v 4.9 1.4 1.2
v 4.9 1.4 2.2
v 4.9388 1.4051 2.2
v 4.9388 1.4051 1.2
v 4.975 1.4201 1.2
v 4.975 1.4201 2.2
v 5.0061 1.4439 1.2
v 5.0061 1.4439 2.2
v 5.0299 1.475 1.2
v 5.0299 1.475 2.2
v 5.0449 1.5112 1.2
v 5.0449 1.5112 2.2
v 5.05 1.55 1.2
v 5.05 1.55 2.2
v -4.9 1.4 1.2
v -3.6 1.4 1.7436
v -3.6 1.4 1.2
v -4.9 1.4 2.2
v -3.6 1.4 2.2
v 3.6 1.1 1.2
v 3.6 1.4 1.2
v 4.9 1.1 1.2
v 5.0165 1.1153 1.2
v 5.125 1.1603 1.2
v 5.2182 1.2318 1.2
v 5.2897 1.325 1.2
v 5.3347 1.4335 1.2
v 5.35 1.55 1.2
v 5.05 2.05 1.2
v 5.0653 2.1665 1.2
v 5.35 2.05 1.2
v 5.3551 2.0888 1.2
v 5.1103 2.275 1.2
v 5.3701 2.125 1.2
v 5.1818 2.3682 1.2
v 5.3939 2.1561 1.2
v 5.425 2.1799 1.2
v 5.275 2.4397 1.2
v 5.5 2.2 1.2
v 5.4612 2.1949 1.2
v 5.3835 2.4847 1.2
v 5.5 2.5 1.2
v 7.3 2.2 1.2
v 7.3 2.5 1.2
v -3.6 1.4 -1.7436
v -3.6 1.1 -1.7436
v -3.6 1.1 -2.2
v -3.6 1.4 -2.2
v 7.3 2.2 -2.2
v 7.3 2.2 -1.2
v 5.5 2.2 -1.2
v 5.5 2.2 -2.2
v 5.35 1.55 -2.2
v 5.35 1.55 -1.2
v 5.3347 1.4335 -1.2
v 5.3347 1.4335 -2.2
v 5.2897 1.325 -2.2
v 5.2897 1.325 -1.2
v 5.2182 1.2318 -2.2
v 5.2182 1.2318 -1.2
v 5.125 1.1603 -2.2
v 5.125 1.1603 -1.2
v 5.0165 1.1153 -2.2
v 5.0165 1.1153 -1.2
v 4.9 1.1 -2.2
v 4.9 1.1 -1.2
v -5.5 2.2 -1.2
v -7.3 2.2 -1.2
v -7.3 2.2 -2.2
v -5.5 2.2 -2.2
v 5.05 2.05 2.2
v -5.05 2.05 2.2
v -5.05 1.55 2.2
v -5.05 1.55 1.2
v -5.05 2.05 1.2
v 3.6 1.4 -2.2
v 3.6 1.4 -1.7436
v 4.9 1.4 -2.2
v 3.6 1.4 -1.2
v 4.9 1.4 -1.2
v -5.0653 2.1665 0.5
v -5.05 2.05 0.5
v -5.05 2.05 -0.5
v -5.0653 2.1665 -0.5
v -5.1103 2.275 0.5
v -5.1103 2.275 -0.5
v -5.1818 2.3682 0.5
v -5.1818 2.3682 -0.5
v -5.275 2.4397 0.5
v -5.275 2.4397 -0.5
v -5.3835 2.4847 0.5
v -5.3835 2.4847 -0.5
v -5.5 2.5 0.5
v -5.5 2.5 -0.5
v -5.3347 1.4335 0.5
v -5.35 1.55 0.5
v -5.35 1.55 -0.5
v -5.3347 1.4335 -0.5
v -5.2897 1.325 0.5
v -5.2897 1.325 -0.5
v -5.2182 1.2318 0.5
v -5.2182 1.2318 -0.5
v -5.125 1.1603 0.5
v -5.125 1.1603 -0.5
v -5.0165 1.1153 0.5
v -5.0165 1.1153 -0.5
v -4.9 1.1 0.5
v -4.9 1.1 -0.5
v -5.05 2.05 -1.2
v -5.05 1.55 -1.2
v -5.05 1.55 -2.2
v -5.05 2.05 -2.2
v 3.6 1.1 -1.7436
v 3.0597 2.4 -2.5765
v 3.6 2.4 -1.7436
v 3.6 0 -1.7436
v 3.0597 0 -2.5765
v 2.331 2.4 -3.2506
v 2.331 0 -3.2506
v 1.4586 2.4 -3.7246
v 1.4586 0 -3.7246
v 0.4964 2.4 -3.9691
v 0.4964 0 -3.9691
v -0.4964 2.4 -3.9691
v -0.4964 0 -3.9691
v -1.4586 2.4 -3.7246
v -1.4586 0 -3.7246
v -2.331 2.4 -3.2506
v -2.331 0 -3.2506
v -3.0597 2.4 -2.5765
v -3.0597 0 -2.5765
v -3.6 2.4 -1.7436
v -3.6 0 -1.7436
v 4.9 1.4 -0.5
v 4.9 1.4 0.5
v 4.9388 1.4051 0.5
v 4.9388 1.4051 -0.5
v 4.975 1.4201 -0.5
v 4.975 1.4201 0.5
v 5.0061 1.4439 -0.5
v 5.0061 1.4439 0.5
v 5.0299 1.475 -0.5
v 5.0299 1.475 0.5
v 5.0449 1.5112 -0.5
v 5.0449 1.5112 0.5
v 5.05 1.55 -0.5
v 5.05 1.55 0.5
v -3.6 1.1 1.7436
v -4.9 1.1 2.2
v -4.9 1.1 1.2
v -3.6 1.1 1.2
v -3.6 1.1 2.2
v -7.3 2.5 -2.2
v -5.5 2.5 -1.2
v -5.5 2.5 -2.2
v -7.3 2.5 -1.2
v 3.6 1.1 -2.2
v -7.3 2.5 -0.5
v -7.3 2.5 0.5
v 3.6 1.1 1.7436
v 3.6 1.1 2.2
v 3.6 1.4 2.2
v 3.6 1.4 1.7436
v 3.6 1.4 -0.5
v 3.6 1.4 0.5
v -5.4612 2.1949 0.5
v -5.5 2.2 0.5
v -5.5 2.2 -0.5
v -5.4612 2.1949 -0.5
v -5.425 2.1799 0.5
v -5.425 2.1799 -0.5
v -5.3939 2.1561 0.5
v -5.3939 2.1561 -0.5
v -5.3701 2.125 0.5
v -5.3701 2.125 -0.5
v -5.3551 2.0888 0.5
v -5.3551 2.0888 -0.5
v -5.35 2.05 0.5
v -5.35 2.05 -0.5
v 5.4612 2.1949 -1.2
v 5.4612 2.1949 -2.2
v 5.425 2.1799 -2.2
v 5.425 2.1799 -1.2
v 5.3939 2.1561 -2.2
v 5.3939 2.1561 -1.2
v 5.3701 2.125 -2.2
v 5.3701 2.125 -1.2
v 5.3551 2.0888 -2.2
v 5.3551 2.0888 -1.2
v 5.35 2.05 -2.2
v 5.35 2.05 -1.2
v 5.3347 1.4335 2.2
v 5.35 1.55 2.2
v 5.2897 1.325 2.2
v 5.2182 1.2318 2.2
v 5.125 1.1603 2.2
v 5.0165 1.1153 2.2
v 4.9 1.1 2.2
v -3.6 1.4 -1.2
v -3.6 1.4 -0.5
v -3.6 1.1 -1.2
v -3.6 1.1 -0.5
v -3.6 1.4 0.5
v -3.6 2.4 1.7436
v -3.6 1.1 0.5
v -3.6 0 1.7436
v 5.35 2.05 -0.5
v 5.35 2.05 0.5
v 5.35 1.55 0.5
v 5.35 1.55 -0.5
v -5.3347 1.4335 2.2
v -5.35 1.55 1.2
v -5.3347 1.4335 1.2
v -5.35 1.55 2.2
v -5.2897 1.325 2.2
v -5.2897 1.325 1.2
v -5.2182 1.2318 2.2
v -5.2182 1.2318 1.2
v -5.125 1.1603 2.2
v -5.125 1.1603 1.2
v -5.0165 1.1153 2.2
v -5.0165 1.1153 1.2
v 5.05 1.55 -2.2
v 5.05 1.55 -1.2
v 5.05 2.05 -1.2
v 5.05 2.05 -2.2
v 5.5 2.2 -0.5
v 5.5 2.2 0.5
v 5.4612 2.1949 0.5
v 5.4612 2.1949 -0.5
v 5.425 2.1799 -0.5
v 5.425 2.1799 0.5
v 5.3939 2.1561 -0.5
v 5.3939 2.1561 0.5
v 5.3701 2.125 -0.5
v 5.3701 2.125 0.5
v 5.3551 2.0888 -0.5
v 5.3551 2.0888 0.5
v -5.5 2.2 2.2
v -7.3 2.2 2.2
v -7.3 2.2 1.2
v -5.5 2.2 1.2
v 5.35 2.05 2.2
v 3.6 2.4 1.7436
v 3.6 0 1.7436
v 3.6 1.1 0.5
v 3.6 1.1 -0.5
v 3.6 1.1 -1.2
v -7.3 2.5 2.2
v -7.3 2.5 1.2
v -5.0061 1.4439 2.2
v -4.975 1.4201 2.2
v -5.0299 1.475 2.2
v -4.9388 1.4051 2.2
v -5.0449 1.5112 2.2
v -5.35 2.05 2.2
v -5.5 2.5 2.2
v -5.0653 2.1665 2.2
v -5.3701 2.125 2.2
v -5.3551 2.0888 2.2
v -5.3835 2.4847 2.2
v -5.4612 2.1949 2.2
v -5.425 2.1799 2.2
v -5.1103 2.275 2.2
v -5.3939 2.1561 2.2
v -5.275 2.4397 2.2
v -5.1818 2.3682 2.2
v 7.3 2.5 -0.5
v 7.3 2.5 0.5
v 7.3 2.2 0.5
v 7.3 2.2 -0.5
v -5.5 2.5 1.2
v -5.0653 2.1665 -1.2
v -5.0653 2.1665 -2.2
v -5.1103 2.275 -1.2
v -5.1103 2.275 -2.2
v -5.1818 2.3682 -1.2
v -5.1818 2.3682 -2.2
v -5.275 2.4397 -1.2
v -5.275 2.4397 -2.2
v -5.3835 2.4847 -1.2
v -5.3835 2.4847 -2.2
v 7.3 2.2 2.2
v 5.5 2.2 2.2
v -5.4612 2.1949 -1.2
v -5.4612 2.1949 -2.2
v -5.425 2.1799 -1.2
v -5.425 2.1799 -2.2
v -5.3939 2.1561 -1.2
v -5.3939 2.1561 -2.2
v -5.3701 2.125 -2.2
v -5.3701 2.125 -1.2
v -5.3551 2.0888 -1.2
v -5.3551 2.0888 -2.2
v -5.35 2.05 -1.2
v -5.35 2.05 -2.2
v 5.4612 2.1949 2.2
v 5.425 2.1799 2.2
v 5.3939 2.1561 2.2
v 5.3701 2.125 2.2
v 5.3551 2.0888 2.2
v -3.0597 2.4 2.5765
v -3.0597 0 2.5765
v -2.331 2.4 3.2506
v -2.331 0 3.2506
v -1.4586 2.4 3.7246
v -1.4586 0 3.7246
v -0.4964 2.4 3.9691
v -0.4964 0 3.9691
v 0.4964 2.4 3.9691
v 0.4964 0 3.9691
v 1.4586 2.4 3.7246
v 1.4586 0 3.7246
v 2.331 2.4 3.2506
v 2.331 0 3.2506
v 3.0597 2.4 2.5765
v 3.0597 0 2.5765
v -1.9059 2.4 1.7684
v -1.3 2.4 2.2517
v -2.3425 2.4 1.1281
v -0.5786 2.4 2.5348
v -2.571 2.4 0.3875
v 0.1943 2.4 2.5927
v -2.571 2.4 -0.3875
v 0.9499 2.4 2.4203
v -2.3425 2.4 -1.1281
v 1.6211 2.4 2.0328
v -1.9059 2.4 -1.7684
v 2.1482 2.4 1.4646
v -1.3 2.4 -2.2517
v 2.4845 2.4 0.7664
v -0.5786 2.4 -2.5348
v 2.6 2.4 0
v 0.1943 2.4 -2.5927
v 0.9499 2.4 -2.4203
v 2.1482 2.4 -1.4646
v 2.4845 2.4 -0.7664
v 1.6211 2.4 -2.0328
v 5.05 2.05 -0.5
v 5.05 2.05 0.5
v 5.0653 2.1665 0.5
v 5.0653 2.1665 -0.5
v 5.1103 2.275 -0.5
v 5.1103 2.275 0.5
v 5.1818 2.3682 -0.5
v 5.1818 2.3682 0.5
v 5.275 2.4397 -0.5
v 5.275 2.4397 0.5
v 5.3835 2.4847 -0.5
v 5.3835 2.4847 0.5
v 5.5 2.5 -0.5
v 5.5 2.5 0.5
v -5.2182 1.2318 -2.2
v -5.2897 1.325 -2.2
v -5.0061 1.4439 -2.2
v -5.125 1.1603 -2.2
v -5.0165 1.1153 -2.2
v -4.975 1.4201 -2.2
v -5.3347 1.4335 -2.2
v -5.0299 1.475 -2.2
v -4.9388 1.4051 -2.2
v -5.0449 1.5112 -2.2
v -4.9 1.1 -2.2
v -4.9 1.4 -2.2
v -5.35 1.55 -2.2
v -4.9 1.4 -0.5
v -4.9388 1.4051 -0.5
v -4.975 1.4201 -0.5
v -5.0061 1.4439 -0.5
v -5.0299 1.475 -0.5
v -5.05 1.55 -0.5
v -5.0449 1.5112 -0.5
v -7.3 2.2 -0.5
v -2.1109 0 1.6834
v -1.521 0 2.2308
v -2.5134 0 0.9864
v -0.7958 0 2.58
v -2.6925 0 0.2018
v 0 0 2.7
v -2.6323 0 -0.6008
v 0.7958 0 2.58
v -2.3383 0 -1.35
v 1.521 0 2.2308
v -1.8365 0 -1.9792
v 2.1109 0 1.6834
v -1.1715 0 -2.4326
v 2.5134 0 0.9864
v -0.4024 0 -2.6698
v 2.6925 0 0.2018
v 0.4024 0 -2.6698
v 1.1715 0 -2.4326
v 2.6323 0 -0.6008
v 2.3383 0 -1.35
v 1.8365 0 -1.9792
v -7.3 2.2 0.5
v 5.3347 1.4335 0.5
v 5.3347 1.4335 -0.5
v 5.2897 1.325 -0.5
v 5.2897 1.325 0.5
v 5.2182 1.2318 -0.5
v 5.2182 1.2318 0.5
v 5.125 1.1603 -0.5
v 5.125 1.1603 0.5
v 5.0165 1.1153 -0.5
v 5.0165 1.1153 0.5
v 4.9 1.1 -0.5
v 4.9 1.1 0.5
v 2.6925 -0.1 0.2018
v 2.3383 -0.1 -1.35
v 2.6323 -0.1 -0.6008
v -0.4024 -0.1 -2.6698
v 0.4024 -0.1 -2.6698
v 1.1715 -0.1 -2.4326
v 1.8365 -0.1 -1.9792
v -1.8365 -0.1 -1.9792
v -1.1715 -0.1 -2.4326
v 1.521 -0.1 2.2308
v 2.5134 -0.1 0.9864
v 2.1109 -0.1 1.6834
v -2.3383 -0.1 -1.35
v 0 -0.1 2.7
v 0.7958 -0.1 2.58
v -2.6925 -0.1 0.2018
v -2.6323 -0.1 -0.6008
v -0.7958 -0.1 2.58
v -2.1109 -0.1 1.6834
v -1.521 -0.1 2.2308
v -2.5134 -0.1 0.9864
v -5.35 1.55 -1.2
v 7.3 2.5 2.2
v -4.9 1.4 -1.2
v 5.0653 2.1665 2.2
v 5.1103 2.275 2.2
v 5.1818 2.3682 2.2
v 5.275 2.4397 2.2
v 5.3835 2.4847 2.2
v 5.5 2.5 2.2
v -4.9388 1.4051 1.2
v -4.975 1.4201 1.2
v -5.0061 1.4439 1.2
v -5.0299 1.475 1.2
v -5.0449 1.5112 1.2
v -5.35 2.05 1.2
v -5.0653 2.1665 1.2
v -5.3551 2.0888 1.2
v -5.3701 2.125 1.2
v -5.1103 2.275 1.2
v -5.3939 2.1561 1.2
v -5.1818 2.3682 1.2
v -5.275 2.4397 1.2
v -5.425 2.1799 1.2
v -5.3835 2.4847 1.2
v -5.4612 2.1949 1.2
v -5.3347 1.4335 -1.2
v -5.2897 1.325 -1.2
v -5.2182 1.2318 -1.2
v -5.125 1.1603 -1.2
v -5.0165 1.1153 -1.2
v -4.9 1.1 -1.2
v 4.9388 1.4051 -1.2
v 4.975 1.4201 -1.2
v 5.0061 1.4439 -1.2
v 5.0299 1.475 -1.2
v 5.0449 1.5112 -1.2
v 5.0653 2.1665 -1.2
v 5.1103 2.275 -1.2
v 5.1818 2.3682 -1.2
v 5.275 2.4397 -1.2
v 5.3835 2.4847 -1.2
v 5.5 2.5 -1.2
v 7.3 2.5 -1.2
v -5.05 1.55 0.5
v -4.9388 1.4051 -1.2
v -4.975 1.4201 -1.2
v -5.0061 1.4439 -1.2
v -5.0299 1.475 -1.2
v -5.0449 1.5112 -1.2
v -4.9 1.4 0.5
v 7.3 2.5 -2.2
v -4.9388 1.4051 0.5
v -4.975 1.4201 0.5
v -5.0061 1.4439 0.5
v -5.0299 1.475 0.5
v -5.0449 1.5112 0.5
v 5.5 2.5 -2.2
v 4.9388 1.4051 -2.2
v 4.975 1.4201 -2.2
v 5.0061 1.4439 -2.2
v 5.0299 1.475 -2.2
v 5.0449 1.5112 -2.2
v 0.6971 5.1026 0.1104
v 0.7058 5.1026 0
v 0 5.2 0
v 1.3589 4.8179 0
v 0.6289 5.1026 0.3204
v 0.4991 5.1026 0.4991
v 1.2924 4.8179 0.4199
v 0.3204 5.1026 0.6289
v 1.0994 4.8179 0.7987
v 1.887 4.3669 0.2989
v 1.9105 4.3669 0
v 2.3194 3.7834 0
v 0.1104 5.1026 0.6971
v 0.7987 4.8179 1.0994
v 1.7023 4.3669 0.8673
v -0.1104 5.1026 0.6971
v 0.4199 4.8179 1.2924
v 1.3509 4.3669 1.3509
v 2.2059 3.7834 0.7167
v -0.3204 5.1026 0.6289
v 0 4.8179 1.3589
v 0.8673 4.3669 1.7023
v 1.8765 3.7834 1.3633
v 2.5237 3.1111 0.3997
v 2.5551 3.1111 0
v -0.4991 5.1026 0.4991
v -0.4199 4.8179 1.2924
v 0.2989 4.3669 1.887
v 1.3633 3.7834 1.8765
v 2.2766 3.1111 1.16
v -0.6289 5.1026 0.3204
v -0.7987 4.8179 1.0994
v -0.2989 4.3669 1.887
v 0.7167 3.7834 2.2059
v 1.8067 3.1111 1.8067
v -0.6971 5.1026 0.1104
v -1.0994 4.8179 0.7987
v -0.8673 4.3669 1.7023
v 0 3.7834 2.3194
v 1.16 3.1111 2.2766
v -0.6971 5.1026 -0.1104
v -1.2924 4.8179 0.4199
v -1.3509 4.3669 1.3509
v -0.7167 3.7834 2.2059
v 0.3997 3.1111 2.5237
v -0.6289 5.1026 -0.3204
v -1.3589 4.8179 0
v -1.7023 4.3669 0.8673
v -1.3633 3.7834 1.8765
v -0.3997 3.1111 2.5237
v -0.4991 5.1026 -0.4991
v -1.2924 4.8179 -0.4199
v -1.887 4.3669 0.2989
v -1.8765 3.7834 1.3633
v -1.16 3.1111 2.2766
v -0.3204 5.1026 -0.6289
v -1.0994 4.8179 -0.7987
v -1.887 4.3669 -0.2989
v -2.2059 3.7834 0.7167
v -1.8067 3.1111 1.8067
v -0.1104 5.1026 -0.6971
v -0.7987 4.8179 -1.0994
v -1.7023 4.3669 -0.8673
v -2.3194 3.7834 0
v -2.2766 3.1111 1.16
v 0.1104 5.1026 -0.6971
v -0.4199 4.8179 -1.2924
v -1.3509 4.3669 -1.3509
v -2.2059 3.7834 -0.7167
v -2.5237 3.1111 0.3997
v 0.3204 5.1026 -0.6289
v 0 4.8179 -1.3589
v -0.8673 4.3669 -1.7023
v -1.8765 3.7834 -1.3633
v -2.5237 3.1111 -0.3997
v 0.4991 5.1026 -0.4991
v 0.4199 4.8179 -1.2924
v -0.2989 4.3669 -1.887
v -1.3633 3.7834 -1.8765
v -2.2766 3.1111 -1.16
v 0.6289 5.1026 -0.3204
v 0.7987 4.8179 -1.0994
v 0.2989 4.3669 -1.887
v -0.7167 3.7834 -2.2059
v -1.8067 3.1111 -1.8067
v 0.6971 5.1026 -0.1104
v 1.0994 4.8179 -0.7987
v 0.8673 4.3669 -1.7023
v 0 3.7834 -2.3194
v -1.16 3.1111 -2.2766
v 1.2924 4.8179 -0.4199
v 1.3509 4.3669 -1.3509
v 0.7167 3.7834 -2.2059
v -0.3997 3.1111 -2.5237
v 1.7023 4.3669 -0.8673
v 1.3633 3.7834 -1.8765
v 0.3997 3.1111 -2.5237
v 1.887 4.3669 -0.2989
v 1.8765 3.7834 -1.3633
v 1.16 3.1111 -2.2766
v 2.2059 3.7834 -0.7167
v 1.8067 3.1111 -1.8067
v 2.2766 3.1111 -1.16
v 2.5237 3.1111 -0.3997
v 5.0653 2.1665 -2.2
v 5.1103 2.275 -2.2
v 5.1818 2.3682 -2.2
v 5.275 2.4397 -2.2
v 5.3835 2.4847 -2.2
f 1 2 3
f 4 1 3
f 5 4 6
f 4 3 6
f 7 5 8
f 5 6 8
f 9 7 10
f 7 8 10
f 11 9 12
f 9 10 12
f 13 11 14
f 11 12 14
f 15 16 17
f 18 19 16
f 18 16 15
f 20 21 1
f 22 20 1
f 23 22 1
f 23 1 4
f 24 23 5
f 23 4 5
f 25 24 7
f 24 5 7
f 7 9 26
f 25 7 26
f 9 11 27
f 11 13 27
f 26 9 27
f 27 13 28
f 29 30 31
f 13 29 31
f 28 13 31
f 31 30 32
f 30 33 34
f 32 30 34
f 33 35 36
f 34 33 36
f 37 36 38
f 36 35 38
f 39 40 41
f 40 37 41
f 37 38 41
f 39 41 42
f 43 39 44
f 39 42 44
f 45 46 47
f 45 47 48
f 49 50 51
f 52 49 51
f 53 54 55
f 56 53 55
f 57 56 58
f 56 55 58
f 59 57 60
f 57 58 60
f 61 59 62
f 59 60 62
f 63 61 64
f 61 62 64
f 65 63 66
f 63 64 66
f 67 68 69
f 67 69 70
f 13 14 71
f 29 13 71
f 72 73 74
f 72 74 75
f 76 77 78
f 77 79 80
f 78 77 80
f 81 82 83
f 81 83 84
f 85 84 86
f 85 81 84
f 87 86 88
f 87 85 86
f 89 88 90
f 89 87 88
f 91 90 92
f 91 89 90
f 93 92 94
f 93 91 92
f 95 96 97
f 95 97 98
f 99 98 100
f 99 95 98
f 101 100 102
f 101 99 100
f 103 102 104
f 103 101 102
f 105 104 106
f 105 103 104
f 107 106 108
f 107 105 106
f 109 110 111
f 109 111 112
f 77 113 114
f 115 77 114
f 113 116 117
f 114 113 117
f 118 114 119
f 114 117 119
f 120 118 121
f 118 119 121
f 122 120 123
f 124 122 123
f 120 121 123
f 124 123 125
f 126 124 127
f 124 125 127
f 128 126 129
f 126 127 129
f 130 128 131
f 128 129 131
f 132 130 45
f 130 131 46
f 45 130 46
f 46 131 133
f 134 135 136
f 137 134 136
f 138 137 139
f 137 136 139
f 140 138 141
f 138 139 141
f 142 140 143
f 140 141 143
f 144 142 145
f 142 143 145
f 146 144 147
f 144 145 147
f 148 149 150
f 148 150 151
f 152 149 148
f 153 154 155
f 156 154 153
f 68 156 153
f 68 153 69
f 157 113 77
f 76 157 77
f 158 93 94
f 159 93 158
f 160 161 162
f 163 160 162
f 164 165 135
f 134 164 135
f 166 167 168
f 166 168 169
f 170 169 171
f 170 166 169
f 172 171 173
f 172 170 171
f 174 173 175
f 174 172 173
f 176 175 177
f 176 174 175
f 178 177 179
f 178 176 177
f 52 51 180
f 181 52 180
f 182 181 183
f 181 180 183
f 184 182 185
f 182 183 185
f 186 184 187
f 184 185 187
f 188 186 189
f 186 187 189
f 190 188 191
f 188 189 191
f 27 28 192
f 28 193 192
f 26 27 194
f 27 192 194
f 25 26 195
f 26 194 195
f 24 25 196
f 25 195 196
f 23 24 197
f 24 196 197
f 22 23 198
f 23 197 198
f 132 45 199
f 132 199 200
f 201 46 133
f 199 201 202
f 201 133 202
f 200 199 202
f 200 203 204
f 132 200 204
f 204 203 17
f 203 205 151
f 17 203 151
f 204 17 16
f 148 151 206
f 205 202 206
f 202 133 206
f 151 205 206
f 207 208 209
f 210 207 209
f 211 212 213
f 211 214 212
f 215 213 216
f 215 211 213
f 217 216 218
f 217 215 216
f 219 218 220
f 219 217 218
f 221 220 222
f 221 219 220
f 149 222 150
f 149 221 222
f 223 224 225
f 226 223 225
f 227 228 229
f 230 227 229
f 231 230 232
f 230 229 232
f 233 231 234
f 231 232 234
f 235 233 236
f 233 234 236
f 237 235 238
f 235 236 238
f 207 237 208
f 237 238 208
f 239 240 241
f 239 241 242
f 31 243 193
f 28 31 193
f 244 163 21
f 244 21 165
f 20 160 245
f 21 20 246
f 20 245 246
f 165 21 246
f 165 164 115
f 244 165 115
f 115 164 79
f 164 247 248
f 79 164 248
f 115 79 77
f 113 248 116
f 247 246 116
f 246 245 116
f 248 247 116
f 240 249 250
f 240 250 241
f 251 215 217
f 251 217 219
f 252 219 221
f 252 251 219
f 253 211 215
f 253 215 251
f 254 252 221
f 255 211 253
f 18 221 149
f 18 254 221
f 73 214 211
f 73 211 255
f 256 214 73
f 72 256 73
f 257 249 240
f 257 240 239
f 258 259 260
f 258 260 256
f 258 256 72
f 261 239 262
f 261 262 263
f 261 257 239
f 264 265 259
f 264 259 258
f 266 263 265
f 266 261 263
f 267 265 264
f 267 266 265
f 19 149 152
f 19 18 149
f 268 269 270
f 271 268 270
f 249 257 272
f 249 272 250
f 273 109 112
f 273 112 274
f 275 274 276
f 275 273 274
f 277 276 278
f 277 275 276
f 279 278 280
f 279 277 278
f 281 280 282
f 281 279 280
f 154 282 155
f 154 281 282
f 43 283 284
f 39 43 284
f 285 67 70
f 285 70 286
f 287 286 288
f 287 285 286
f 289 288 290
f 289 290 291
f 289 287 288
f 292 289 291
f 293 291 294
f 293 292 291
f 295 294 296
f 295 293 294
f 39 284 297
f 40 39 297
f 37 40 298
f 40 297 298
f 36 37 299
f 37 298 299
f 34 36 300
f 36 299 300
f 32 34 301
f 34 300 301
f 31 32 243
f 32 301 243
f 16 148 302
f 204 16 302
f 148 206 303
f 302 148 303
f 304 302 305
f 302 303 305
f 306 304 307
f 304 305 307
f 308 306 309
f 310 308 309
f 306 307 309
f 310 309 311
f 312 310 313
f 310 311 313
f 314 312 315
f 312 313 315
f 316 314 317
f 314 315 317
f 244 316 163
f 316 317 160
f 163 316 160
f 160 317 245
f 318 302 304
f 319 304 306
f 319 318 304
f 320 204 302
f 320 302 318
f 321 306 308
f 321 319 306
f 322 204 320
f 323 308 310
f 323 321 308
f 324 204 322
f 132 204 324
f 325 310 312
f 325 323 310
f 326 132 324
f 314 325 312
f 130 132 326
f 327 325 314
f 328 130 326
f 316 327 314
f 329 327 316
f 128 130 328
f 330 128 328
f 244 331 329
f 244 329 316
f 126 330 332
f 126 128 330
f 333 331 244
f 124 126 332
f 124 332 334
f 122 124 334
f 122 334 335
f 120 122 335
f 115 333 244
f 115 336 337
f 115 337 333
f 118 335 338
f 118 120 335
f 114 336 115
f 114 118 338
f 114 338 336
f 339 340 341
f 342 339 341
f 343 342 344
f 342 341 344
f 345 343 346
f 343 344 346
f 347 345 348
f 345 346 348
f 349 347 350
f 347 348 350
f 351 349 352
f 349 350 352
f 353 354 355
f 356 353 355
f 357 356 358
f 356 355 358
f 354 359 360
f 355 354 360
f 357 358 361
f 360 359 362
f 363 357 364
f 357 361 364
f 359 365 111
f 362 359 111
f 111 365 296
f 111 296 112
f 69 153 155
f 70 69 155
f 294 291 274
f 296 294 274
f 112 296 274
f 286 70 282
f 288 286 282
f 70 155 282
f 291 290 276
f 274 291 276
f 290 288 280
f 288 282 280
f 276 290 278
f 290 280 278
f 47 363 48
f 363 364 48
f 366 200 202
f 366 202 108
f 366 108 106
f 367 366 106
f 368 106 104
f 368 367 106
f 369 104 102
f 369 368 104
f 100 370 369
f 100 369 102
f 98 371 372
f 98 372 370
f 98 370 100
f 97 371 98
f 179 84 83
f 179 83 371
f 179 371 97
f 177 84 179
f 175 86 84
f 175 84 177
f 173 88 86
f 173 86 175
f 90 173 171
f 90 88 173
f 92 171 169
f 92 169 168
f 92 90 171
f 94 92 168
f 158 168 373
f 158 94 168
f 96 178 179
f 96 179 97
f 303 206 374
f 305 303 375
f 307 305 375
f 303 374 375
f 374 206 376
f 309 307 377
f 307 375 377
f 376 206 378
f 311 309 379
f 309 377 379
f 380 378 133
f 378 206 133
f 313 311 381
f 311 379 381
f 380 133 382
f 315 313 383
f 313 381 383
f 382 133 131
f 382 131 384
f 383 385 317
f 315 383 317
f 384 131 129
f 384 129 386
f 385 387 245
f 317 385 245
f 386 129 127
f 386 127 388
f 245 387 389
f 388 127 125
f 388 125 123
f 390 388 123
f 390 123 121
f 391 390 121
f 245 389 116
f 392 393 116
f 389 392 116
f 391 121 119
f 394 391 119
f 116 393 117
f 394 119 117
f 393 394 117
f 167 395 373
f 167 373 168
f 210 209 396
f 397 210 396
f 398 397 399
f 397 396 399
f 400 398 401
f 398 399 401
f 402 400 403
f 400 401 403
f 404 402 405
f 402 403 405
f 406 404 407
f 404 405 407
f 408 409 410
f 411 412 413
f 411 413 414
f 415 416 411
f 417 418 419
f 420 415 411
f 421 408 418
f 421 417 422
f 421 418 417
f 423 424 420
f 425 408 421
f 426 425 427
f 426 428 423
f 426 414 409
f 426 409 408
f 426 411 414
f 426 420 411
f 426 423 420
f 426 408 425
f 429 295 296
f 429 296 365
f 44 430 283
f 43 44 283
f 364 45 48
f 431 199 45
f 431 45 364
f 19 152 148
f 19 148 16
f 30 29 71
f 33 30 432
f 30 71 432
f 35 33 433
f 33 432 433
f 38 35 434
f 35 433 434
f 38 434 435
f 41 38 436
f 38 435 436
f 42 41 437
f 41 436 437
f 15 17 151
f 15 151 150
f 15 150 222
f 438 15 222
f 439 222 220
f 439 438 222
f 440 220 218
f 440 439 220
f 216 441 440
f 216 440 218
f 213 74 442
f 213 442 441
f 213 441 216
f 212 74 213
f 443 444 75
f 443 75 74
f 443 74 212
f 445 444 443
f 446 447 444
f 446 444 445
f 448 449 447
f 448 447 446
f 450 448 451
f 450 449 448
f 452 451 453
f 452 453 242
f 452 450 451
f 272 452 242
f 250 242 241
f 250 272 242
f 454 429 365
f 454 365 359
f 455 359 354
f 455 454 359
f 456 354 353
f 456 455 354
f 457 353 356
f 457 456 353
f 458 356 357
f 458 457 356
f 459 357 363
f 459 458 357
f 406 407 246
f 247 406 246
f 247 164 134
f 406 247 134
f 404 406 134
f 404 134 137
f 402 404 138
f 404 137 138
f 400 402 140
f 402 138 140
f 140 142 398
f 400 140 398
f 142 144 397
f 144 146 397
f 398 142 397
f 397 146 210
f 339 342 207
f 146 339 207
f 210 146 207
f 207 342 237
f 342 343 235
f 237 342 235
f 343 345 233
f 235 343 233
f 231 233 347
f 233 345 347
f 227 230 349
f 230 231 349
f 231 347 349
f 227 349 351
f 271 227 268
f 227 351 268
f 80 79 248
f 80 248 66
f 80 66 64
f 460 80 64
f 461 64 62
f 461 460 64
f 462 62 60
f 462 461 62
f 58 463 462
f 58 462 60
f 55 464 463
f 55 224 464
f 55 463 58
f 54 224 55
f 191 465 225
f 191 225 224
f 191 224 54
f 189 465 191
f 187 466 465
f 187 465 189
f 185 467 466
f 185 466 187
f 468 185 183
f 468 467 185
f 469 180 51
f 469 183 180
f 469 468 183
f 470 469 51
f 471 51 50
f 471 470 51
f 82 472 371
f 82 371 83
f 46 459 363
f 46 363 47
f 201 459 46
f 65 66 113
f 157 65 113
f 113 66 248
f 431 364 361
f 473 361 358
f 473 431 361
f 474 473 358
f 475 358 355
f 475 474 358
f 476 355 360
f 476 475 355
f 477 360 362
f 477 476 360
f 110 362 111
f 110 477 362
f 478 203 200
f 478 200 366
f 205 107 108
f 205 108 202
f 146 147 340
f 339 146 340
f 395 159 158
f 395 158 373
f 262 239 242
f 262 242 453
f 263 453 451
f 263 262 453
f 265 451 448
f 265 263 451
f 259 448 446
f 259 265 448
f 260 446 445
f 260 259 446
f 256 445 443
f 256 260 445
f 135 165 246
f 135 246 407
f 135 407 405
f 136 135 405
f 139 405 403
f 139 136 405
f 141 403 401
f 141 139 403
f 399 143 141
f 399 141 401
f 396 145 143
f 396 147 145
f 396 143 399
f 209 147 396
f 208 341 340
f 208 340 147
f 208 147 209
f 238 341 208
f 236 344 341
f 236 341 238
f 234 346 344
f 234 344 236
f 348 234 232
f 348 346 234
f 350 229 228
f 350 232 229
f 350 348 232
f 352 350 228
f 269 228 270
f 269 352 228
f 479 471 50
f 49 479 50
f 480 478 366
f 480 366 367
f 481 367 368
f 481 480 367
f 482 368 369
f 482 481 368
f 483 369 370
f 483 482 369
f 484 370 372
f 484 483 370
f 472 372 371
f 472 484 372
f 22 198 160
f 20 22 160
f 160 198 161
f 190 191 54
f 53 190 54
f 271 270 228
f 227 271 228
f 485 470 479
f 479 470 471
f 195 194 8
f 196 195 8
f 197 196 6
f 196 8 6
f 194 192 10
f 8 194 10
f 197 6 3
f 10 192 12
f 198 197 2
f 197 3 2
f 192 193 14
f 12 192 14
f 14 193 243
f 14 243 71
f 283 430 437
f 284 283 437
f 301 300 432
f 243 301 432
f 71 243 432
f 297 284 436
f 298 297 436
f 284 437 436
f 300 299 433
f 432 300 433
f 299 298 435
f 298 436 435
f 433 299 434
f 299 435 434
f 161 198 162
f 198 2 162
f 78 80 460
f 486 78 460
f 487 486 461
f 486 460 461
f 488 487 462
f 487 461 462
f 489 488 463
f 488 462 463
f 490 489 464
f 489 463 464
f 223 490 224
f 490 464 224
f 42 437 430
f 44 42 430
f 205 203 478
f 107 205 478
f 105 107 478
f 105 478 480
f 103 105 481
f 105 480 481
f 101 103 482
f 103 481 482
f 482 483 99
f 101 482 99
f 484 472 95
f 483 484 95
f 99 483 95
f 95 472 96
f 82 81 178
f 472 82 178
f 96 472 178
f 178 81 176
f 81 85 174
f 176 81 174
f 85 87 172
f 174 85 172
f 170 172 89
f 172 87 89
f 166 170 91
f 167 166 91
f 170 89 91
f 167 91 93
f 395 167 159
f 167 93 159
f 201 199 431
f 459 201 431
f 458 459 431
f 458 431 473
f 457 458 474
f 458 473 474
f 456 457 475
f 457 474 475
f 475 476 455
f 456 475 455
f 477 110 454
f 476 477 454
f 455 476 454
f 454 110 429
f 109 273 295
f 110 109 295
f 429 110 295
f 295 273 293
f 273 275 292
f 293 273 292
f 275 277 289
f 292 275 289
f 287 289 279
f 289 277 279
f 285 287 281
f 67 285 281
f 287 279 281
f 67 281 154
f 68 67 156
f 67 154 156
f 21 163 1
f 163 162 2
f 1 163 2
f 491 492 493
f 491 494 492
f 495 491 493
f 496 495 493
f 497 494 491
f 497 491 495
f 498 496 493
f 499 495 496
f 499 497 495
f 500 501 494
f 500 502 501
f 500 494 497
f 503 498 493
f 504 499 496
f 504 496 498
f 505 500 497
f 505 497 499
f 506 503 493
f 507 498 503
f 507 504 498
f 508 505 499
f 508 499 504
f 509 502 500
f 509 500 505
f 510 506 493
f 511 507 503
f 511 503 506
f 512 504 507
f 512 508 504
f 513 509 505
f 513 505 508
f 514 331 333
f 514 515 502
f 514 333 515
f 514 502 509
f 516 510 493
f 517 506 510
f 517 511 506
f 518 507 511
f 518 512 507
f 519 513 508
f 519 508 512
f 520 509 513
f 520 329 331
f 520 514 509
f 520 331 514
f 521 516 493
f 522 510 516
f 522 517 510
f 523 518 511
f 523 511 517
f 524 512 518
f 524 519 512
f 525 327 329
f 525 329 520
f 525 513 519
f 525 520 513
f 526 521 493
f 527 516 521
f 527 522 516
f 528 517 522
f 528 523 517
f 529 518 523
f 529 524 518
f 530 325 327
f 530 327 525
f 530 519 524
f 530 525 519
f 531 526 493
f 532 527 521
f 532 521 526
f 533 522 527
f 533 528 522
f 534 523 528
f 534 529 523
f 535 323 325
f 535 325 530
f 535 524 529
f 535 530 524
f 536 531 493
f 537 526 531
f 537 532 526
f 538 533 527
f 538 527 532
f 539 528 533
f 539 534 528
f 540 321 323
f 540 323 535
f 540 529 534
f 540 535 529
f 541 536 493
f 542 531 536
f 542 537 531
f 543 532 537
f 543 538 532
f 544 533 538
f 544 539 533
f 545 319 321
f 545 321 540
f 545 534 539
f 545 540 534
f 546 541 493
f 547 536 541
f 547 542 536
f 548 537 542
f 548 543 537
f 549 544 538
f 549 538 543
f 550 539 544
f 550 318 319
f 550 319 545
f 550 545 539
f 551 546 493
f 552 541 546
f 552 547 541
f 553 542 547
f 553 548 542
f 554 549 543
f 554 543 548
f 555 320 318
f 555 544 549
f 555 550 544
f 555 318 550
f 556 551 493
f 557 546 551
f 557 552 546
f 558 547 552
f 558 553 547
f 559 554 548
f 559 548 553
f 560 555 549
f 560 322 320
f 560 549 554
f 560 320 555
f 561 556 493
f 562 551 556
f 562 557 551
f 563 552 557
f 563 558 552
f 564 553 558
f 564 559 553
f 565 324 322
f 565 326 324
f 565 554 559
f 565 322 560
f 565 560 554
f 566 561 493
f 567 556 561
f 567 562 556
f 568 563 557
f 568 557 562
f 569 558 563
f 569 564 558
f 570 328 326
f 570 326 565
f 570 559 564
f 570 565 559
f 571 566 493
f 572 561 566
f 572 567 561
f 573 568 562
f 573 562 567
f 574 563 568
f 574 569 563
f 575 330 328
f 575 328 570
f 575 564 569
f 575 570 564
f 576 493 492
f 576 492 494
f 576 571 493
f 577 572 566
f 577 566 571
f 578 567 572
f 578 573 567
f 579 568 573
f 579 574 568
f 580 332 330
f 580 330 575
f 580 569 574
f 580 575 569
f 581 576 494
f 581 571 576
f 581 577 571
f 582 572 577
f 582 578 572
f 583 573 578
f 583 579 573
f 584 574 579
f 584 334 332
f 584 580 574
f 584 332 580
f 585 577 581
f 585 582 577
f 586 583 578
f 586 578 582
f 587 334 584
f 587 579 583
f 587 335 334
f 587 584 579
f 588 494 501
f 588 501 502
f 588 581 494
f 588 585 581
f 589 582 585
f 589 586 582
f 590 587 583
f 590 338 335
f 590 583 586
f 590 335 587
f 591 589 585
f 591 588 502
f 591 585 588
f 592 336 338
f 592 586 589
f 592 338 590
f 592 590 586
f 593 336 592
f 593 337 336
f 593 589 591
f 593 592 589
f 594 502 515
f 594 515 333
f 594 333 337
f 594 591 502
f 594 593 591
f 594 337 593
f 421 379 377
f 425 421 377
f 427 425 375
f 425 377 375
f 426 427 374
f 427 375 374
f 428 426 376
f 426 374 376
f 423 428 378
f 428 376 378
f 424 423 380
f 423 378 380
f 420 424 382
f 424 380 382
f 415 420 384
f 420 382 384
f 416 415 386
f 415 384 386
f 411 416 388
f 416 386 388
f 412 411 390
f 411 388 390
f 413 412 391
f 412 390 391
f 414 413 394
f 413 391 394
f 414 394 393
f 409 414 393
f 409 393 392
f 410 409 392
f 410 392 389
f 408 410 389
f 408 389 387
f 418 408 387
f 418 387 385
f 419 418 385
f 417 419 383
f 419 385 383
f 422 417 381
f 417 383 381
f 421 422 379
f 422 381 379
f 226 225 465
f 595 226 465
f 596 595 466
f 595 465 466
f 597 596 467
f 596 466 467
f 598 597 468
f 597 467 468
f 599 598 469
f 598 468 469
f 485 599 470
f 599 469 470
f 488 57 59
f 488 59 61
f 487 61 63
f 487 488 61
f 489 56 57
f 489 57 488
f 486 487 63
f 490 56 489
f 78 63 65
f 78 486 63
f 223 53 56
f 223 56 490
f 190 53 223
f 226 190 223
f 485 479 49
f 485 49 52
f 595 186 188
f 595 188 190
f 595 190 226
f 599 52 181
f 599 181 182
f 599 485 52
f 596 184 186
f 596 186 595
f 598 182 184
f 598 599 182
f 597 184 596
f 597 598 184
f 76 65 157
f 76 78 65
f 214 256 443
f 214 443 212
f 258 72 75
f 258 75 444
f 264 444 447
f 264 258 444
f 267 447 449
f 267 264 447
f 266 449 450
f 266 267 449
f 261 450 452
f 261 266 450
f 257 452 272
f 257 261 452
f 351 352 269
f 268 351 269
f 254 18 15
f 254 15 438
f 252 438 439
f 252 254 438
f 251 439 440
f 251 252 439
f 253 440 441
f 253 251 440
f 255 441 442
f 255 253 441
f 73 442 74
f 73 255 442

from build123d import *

# Parameters (mm, degrees)
LED_BASE_BOSS_EXTRUDE1_DEPTH                   = 2.4
PIN_RIGHT_BOSS_EXTRUDE2_DEPTH                  = 2.2
PIN_RIGHT_SPACE_CUT_EXTRUDE1_REACH             = 11.15
SKETCH5_W                                      = 3.7
SKETCH5_H                                      = 0.7
PIN_RIGHT_SPACE_CUT_EXTRUDE1_DIRECTION_2_REACH = 11.15
SKETCH6_R                                      = 2.7
HEATSINK_BOSS_EXTRUDE3_DEPTH                   = 0.1


with BuildPart() as part:
    # Sketch1 → LED Base Boss-Extrude1 (new body)
    with BuildSketch(Plane(origin=(0, 0, 0), x_dir=(1, 0, 0), z_dir=(0, 1, 0))):
        with BuildLine():
            Line((-3.6, 1.743559577), (-3.6, -1.743559577))
            ThreePointArc((-3.6, -1.743559577), (0, -4), (3.6, -1.743559577))
            Line((3.6, -1.743559577), (3.6, 1.743559577))
            ThreePointArc((3.6, 1.743559577), (0, 4), (-3.6, 1.743559577))
        make_face()
    extrude(amount=LED_BASE_BOSS_EXTRUDE1_DEPTH)

    # Sketch3 → LED Lens Revolve2 (revolve)
    with BuildSketch(Plane.XY):
        with BuildLine():
            Line((2.6, 2.4), (0, 2.4))
            Line((0, 2.4), (0, 5.2))
            ThreePointArc((0, 5.2), (1.910497317, 4.366890366), (2.6, 2.4))
        make_face()
    revolve(axis=Axis((0, 5.2, 0), (0, -1, 0)))

    # Sketch4 → Pin Right Boss-Extrude2 (add, symmetric)
    with BuildSketch(Plane.XY):
        with BuildLine():
            Line((3.6, 1.4), (4.9, 1.4))
            ThreePointArc((4.9, 1.4), (5.006066017, 1.443933983), (5.05, 1.55))
            Line((5.05, 1.55), (5.05, 2.05))
            ThreePointArc((5.05, 2.05), (5.181801948, 2.368198052), (5.5, 2.5))
            Line((5.5, 2.5), (7.3, 2.5))
            Line((7.3, 2.5), (7.3, 2.2))
            Line((7.3, 2.2), (5.5, 2.2))
            ThreePointArc((5.5, 2.2), (5.393933983, 2.156066017), (5.35, 2.05))
            Line((5.35, 2.05), (5.35, 1.55))
            ThreePointArc((5.35, 1.55), (5.218198052, 1.231801948), (4.9, 1.1))
            Line((4.9, 1.1), (3.6, 1.1))
            Line((3.6, 1.1), (3.6, 1.4))
        make_face()
    pin_right_boss_extrude2 = extrude(amount=PIN_RIGHT_BOSS_EXTRUDE2_DEPTH, both=True)

    # Pin Right Space Cut-Extrude1: up to this face of the body (flat: up to its plane)
    pin_right_space_cut_extrude1_end = Plane(part.part.faces().sort_by_distance((6.4, 2.5, 0))[0])
    # Sketch5 → Pin Right Space Cut-Extrude1 (cut, up to the picked face)
    with BuildSketch(Plane(origin=(0, 1.4, 0), x_dir=(1, 0, 0), z_dir=(0, 1, 0)), mode=Mode.PRIVATE) as pin_right_space_cut_extrude1_sk1:
        with Locations((5.45, 0.85)):
            Rectangle(SKETCH5_W, SKETCH5_H)
    pin_right_space_cut_extrude1_tool1 = split(extrude(pin_right_space_cut_extrude1_sk1.sketch, amount=PIN_RIGHT_SPACE_CUT_EXTRUDE1_REACH, mode=Mode.PRIVATE), bisect_by=pin_right_space_cut_extrude1_end, keep=Keep.BOTH, mode=Mode.PRIVATE)
    # Sketch5 → Pin Right Space Cut-Extrude1 (cut, up to the picked face)
    with BuildSketch(Plane(origin=(0, 1.4, 0), x_dir=(1, 0, 0), z_dir=(0, 1, 0)), mode=Mode.PRIVATE) as pin_right_space_cut_extrude1_sk2:
        with Locations((5.45, -0.85)):
            Rectangle(SKETCH5_W, SKETCH5_H)
    pin_right_space_cut_extrude1_tool2 = split(extrude(pin_right_space_cut_extrude1_sk2.sketch, amount=PIN_RIGHT_SPACE_CUT_EXTRUDE1_REACH, mode=Mode.PRIVATE), bisect_by=pin_right_space_cut_extrude1_end, keep=Keep.BOTH, mode=Mode.PRIVATE)
    pin_right_space_cut_extrude1_1 = pin_right_space_cut_extrude1_tool1.solids().sort_by(Axis((5.45, 1.4, -0.85), (0, 1, 0)))[0]
    add(pin_right_space_cut_extrude1_1, mode=Mode.SUBTRACT)
    pin_right_space_cut_extrude1_2 = pin_right_space_cut_extrude1_tool2.solids().sort_by(Axis((5.45, 1.4, 0.85), (0, 1, 0)))[0]
    add(pin_right_space_cut_extrude1_2, mode=Mode.SUBTRACT)
    pin_right_space_cut_extrude1 = pin_right_space_cut_extrude1_1 + pin_right_space_cut_extrude1_2  # Pin Right Space Cut-Extrude1 as one shape, for the pattern or mirror that repeats it

    # Pin Right Space Cut-Extrude1 direction 2: up to this face of the body (flat: up to its plane)
    pin_right_space_cut_extrude1_direction_2_end = Plane(part.part.faces().sort_by_distance((4.25, 1.1, 0))[0])
    # Sketch5 → Pin Right Space Cut-Extrude1 direction 2 (cut, up to the picked face)
    with BuildSketch(Plane(origin=(0, 1.4, 0), x_dir=(1, 0, 0), z_dir=(0, 1, 0)), mode=Mode.PRIVATE) as pin_right_space_cut_extrude1_direction_2_sk1:
        with Locations((5.45, 0.85)):
            Rectangle(SKETCH5_W, SKETCH5_H)
    pin_right_space_cut_extrude1_direction_2_tool1 = split(extrude(pin_right_space_cut_extrude1_direction_2_sk1.sketch, amount=-PIN_RIGHT_SPACE_CUT_EXTRUDE1_DIRECTION_2_REACH, mode=Mode.PRIVATE), bisect_by=pin_right_space_cut_extrude1_direction_2_end, keep=Keep.BOTH, mode=Mode.PRIVATE)
    # Sketch5 → Pin Right Space Cut-Extrude1 direction 2 (cut, up to the picked face)
    with BuildSketch(Plane(origin=(0, 1.4, 0), x_dir=(1, 0, 0), z_dir=(0, 1, 0)), mode=Mode.PRIVATE) as pin_right_space_cut_extrude1_direction_2_sk2:
        with Locations((5.45, -0.85)):
            Rectangle(SKETCH5_W, SKETCH5_H)
    pin_right_space_cut_extrude1_direction_2_tool2 = split(extrude(pin_right_space_cut_extrude1_direction_2_sk2.sketch, amount=-PIN_RIGHT_SPACE_CUT_EXTRUDE1_DIRECTION_2_REACH, mode=Mode.PRIVATE), bisect_by=pin_right_space_cut_extrude1_direction_2_end, keep=Keep.BOTH, mode=Mode.PRIVATE)
    pin_right_space_cut_extrude1_direction_2_1 = pin_right_space_cut_extrude1_direction_2_tool1.solids().sort_by(Axis((5.45, 1.4, -0.85), (0, -1, 0)))[0]
    add(pin_right_space_cut_extrude1_direction_2_1, mode=Mode.SUBTRACT)
    pin_right_space_cut_extrude1_direction_2_2 = pin_right_space_cut_extrude1_direction_2_tool2.solids().sort_by(Axis((5.45, 1.4, 0.85), (0, -1, 0)))[0]
    add(pin_right_space_cut_extrude1_direction_2_2, mode=Mode.SUBTRACT)
    pin_right_space_cut_extrude1_direction_2 = pin_right_space_cut_extrude1_direction_2_1 + pin_right_space_cut_extrude1_direction_2_2  # Pin Right Space Cut-Extrude1 direction 2 as one shape, for the pattern or mirror that repeats it

    # Pin Left Mirror1: Pin Right Boss-Extrude2, Pin Right Space Cut-Extrude1, Pin Right Space Cut-Extrude1 direction 2 across plane
    add(pin_right_boss_extrude2.mirror(Plane(origin=(0, 0, 0), x_dir=(0, 0, 1), z_dir=(1, 0, 0))))
    add(pin_right_space_cut_extrude1.mirror(Plane(origin=(0, 0, 0), x_dir=(0, 0, 1), z_dir=(1, 0, 0))), mode=Mode.SUBTRACT)
    add(pin_right_space_cut_extrude1_direction_2.mirror(Plane(origin=(0, 0, 0), x_dir=(0, 0, 1), z_dir=(1, 0, 0))), mode=Mode.SUBTRACT)

    # Sketch6 → Heatsink Boss-Extrude3 (add)
    with BuildSketch(Plane.XZ):
        Circle(SKETCH6_R)
    extrude(amount=HEATSINK_BOSS_EXTRUDE3_DEPTH)


solid = part.part
